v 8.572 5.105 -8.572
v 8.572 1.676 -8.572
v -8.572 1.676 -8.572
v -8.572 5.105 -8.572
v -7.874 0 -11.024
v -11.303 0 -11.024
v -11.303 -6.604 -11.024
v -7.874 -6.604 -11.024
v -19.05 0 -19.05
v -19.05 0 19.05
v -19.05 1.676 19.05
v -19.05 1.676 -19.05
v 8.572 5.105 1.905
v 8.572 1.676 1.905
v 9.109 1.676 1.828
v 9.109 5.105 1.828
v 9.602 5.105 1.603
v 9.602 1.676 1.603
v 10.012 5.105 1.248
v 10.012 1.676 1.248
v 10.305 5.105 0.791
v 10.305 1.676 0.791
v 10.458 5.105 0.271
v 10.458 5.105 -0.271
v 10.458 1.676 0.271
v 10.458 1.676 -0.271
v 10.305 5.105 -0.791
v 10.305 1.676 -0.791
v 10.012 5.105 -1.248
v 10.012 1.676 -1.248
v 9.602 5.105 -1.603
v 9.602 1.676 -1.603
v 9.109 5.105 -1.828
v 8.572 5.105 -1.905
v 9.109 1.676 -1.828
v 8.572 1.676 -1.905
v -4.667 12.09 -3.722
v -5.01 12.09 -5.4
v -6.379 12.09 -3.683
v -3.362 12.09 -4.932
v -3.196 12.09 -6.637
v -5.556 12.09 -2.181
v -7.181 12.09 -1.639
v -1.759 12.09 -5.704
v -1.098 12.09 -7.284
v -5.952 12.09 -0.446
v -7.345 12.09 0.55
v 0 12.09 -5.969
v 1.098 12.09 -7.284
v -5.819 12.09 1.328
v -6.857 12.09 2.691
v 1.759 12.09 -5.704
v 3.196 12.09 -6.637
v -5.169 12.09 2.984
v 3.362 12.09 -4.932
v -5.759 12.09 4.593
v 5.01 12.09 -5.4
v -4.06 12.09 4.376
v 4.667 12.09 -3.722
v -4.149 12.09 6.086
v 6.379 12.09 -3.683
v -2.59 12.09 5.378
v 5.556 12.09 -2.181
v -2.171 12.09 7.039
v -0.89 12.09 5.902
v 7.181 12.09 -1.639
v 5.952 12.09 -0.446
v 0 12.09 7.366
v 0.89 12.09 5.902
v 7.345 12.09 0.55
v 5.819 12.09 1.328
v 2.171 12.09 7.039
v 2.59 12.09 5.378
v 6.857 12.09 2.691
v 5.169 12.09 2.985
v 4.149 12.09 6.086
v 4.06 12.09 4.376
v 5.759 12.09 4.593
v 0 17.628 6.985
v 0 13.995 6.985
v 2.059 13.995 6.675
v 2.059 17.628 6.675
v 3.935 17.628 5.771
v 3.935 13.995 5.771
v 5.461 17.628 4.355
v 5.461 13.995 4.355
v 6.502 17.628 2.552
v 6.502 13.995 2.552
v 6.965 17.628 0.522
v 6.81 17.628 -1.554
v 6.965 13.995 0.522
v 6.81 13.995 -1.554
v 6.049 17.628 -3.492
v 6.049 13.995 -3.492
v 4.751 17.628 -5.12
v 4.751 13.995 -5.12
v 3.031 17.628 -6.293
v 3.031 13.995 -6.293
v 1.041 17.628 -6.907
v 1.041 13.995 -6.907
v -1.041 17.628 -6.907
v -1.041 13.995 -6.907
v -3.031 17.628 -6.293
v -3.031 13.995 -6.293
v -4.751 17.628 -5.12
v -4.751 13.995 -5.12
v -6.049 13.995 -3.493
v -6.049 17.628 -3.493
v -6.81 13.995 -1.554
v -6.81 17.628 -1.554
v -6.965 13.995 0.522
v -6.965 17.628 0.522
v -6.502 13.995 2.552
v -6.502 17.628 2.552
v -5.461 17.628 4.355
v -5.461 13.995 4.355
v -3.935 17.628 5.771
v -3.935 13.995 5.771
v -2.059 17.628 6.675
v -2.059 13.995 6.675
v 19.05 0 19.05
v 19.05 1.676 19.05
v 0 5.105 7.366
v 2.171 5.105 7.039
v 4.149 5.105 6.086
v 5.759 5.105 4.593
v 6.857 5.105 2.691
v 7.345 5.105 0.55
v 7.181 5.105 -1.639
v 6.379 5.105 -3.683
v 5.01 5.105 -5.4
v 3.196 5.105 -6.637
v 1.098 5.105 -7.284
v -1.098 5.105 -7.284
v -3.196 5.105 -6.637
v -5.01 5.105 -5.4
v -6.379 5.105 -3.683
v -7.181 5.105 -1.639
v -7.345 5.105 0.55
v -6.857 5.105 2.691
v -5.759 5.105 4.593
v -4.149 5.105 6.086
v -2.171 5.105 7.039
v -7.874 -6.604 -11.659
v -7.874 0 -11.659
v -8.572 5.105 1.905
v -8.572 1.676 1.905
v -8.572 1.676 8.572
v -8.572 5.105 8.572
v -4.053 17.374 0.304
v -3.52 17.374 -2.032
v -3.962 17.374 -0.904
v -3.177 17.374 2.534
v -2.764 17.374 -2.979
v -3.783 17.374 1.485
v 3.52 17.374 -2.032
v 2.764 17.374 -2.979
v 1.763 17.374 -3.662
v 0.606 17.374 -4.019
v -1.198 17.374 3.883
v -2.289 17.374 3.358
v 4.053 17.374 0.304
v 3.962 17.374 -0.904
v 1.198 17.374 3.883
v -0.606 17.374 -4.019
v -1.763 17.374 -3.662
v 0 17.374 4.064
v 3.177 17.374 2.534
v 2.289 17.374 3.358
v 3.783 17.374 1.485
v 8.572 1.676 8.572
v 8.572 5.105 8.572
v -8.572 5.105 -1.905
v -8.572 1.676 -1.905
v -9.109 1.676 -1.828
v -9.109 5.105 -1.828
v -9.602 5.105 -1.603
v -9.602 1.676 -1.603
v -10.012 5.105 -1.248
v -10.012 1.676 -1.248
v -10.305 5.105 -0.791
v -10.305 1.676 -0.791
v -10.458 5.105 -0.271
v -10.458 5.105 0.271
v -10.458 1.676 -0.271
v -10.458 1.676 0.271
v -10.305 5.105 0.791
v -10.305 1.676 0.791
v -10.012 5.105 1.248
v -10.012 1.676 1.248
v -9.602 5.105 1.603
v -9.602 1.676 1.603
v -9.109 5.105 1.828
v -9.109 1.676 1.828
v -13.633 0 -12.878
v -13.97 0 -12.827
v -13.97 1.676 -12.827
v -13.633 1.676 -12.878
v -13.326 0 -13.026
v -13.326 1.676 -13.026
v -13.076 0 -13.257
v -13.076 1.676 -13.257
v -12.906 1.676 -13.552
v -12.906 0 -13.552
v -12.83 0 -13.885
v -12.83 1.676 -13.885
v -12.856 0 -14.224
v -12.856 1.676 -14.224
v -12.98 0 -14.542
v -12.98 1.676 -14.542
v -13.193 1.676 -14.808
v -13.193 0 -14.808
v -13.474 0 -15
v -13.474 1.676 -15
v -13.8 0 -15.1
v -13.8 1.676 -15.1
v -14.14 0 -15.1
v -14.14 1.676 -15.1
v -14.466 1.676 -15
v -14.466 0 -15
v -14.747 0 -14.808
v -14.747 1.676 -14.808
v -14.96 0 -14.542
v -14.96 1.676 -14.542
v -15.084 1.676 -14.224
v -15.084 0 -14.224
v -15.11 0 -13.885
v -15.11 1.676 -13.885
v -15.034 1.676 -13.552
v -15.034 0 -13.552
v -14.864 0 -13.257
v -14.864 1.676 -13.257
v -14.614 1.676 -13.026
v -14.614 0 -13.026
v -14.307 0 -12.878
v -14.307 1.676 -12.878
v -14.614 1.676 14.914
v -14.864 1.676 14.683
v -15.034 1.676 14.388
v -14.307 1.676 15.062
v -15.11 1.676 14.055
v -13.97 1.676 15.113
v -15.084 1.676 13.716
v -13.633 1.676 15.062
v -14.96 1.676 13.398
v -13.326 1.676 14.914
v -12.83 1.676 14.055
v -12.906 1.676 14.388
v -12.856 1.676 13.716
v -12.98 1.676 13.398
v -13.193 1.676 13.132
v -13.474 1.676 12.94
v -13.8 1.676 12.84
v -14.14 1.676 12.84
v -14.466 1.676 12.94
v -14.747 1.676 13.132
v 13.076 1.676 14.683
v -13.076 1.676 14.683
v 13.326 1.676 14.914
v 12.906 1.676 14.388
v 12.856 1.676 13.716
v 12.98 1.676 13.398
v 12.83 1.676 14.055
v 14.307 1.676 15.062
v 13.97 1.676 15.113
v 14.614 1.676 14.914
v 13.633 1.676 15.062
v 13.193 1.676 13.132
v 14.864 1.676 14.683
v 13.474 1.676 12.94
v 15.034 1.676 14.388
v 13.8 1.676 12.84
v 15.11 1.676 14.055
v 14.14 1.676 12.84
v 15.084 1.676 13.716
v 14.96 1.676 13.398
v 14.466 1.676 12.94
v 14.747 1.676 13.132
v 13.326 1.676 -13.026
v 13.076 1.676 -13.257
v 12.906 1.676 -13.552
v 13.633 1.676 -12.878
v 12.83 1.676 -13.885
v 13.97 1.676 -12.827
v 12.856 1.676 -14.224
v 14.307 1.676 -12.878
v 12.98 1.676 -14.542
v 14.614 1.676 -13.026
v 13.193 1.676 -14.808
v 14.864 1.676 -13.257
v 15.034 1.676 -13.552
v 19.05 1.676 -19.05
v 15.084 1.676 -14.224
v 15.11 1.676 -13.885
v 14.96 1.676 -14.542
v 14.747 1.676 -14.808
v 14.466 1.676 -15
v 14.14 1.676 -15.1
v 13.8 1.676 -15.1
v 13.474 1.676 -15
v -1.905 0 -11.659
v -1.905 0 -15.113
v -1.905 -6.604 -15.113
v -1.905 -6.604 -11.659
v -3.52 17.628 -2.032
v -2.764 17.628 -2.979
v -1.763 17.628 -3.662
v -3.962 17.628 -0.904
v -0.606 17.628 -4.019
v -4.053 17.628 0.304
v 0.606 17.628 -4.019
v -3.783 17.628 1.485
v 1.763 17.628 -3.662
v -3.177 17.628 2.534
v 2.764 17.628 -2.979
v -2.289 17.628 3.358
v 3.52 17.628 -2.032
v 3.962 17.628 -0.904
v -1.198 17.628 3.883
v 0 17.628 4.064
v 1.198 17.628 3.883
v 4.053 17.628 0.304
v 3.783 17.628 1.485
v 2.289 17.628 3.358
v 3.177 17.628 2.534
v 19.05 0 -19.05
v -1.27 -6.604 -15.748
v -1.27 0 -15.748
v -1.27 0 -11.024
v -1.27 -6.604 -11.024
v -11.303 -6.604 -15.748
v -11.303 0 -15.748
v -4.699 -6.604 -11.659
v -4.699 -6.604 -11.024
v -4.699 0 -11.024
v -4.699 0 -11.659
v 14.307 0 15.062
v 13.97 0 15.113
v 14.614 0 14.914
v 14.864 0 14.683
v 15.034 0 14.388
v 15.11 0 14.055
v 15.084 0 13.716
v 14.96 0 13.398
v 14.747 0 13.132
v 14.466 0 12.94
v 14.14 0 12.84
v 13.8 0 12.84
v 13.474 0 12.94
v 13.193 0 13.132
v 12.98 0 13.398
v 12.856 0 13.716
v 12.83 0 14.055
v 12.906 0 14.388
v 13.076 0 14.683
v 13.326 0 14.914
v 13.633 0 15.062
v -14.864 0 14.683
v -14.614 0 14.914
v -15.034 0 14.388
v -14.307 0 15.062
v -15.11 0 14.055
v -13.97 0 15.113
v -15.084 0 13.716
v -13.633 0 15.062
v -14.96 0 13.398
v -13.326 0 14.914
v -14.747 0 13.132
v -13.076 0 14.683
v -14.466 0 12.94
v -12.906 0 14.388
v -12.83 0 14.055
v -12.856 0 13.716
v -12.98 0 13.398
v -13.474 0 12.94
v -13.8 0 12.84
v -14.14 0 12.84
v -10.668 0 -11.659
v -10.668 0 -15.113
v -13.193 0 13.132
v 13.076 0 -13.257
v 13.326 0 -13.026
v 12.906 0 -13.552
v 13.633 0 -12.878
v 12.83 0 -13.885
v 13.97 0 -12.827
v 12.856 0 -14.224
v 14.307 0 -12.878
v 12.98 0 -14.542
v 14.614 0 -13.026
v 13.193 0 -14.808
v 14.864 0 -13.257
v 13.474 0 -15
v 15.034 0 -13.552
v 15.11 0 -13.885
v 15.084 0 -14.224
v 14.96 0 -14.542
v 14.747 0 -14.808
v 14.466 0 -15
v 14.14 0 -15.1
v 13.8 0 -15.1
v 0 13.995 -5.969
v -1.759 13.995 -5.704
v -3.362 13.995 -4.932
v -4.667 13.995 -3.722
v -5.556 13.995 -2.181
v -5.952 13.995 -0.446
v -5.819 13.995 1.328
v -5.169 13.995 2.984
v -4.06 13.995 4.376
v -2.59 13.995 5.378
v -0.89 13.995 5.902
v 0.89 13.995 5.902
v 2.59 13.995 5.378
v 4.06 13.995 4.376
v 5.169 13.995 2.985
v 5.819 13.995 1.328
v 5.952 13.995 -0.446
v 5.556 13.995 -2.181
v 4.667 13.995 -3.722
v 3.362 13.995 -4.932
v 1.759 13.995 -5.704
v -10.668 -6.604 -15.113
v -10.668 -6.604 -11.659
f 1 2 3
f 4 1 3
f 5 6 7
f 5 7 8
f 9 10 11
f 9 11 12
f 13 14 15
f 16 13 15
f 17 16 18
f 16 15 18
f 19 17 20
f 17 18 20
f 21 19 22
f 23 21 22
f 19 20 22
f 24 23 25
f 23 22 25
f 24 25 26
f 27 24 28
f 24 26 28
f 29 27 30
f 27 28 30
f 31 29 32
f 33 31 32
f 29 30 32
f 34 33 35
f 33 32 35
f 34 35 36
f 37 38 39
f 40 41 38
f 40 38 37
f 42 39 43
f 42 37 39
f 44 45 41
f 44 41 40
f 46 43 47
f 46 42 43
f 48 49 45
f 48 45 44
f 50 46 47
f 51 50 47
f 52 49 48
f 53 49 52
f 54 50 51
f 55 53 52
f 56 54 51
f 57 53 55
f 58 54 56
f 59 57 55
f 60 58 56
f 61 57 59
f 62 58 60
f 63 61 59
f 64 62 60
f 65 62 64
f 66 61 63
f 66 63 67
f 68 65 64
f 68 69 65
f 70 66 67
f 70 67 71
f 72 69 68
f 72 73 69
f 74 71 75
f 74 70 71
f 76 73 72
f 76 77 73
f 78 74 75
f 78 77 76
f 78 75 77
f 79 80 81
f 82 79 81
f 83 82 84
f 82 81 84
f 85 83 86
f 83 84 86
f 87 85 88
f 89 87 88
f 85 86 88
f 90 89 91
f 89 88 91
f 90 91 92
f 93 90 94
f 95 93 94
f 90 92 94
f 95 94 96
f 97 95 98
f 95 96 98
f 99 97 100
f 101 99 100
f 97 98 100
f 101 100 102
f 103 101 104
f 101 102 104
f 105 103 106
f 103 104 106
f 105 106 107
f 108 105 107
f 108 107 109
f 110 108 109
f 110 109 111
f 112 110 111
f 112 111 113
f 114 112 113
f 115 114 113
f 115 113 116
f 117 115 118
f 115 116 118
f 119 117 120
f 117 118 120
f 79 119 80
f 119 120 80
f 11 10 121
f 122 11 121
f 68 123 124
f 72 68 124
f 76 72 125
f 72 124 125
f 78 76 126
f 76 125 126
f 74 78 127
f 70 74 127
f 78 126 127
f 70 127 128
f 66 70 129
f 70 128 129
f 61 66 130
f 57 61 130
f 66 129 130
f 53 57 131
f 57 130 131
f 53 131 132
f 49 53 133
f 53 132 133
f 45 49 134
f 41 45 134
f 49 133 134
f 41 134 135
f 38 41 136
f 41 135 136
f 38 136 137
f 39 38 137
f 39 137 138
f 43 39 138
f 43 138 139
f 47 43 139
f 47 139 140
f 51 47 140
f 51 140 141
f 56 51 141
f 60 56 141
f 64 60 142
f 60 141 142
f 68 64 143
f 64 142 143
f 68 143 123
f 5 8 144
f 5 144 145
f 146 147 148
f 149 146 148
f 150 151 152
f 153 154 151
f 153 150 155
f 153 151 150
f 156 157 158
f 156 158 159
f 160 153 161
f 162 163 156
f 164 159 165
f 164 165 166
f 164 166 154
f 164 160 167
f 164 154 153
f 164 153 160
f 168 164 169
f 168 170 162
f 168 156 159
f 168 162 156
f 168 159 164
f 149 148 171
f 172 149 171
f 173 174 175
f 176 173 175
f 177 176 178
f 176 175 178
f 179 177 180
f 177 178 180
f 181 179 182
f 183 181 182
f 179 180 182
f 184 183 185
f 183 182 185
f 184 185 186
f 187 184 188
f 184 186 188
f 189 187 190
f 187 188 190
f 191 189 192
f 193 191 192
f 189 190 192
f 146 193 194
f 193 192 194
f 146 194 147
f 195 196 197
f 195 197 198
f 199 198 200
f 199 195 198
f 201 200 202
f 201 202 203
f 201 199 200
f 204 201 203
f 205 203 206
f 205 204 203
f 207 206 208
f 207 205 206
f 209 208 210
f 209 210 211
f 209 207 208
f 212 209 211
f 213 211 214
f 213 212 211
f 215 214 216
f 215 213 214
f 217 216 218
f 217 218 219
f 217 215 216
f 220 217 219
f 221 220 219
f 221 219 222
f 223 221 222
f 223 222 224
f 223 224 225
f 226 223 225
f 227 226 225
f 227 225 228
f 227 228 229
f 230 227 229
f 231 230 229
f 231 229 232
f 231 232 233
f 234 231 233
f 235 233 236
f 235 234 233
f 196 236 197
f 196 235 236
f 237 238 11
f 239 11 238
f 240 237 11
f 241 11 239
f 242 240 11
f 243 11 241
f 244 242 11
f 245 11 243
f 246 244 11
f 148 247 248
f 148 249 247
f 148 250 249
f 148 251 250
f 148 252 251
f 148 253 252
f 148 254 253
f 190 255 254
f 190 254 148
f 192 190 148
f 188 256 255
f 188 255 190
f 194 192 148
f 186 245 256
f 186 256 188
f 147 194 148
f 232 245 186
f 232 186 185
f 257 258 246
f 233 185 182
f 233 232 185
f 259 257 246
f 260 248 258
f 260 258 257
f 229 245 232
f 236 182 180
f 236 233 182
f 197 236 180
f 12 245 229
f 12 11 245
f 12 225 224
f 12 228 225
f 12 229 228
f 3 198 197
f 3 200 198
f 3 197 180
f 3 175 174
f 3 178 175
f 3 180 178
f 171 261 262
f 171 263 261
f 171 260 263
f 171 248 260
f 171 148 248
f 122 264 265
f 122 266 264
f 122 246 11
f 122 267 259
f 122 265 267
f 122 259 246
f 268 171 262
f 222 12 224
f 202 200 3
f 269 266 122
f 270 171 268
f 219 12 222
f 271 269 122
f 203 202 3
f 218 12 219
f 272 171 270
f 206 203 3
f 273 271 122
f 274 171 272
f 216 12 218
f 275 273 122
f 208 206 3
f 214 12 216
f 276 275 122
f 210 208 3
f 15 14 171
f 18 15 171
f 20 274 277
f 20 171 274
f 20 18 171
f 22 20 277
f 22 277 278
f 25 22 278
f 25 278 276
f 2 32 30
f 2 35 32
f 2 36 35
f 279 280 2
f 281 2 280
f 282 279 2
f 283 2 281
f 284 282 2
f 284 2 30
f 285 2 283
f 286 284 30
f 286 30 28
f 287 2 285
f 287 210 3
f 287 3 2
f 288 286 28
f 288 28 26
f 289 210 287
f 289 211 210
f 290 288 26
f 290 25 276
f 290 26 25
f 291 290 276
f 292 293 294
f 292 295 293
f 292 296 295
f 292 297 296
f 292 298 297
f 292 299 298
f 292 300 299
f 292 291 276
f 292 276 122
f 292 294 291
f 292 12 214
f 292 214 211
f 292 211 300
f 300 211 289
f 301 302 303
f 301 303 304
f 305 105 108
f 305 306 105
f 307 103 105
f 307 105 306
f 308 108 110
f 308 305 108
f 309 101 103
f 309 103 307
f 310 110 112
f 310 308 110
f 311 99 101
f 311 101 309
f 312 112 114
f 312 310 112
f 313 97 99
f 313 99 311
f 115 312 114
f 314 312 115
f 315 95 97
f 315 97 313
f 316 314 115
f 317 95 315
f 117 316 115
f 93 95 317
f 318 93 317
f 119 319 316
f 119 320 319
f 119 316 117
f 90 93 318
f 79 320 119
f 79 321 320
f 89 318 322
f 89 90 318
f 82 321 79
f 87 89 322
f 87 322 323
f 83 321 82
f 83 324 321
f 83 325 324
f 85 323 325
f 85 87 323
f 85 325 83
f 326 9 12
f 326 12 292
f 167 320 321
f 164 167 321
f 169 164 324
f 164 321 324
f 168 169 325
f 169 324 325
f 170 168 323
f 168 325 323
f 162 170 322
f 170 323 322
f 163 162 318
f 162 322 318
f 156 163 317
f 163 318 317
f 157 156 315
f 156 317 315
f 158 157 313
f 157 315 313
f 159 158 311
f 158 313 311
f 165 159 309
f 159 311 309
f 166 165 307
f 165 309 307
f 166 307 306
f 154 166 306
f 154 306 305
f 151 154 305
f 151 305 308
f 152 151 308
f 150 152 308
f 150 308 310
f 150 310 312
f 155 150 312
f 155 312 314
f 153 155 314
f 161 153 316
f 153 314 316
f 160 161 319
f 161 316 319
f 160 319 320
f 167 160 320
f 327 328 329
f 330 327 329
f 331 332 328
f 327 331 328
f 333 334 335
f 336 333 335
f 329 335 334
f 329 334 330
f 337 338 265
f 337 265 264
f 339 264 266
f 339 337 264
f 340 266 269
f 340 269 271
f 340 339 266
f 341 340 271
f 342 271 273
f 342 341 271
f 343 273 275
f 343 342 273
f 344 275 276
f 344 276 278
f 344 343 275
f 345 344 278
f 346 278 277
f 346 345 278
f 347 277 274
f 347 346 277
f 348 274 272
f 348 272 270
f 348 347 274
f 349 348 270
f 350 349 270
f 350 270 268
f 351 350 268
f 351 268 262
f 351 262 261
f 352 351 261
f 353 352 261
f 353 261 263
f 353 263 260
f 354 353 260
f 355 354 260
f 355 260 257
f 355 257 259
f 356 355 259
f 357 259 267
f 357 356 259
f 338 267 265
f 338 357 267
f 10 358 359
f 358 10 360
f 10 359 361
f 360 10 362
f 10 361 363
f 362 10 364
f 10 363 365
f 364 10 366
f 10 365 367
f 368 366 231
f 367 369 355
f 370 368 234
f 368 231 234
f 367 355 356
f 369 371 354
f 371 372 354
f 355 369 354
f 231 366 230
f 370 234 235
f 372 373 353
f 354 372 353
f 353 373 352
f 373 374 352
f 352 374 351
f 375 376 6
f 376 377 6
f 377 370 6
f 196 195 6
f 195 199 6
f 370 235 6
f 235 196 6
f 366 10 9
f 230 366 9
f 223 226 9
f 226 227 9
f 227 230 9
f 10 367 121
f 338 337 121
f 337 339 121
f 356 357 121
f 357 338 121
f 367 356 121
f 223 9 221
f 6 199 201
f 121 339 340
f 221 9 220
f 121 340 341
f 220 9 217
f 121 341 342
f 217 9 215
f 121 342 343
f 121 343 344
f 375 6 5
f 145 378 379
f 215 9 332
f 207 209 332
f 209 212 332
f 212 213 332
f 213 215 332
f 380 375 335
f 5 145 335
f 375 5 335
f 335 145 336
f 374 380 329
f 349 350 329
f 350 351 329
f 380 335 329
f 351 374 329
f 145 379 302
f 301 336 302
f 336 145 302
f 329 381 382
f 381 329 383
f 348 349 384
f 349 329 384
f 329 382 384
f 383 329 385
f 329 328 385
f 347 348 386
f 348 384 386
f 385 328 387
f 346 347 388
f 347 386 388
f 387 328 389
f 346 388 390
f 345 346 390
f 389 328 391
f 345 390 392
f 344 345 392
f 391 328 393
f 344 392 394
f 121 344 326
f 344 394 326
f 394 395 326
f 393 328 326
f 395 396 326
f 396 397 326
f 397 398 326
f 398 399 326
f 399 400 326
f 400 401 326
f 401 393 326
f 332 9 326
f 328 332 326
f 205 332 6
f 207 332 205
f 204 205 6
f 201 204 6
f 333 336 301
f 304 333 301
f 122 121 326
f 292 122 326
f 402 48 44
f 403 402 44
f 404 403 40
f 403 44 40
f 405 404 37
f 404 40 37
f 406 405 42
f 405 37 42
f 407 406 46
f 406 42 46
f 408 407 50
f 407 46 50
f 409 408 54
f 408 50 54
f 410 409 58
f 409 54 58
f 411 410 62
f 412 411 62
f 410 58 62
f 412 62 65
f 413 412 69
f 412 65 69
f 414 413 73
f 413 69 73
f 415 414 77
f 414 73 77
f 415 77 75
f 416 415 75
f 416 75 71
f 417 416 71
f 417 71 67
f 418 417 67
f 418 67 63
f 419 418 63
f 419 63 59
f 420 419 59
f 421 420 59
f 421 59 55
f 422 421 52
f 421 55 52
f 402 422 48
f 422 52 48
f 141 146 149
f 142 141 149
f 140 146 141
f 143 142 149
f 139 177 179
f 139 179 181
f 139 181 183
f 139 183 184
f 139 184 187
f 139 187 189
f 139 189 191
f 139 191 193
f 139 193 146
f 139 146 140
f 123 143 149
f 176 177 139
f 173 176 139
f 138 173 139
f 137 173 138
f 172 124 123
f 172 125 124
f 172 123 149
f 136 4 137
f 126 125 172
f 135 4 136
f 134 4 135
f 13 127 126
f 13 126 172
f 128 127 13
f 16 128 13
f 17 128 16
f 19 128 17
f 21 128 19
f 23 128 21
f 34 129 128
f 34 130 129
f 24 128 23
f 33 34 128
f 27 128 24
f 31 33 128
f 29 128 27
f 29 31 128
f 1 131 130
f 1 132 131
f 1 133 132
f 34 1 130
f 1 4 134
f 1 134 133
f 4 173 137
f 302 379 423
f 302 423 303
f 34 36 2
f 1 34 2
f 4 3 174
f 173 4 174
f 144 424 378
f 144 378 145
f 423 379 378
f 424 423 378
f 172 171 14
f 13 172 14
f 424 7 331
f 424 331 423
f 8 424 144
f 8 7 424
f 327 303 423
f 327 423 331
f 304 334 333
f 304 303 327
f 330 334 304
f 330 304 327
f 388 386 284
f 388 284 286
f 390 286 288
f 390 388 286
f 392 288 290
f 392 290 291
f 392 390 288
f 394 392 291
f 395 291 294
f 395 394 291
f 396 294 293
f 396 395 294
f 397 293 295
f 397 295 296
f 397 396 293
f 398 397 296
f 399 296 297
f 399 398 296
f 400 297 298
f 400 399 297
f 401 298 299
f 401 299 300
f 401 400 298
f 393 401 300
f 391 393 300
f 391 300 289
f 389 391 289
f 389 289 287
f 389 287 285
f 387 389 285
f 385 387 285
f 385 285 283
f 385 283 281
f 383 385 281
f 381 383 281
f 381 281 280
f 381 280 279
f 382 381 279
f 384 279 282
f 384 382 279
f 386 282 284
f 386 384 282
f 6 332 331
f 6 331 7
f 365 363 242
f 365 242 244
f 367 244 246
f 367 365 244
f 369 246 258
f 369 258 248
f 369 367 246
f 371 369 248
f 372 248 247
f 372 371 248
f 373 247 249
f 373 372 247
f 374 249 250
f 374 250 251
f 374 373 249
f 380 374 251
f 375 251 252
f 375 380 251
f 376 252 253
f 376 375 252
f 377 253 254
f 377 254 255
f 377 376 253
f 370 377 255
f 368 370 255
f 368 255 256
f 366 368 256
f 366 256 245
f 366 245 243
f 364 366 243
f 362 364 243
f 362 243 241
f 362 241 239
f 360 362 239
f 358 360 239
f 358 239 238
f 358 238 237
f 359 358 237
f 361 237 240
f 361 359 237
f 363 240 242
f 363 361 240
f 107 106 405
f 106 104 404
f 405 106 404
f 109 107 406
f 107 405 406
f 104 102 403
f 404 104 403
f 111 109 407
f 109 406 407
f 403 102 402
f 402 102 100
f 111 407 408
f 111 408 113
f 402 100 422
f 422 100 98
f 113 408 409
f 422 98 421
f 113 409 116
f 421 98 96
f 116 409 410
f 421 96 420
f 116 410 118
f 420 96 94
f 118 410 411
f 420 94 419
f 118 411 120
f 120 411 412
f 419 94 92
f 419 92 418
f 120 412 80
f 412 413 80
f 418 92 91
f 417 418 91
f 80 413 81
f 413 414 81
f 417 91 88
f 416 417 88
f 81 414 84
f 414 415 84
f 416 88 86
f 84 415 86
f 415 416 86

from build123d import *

# Parameters (mm, degrees)
SKETCH1_W           = 38.1
SKETCH1_H           = 38.1
SKETCH1_R           = 1.143
BOSS_EXTRUDE1_DEPTH = 1.6764
BOSS_EXTRUDE2_DEPTH = 3.429
SKETCH3_R           = 7.366
BOSS_EXTRUDE3_DEPTH = 6.985
SKETCH4_R           = 5.969
BOSS_EXTRUDE4_DEPTH = 1.905
SKETCH5_R           = 6.985
BOSS_EXTRUDE5_DEPTH = 3.6322
SKETCH6_R           = 4.064
CUT_EXTRUDE1_DEPTH  = 0.254
SKETCH7_W           = 10.033
SKETCH7_H           = 4.7244
SKETCH7_W_2         = 8.763
SKETCH7_H_2         = 3.4544
BOSS_EXTRUDE6_DEPTH = 6.604
CUT_EXTRUDE2_REACH  = 41.725
SKETCH9_W           = 3.175
SKETCH9_H           = 6.604


with BuildPart() as part:
    # Sketch1 → Boss-Extrude1 (new body)
    with BuildSketch(Plane(origin=(0, 0, 0), x_dir=(1, 0, 0), z_dir=(0, 1, 0))):
        Rectangle(SKETCH1_W, SKETCH1_H)
        with Locations(Location((-13.97, 13.97, 0), (0, 0, 270))):
            Circle(SKETCH1_R, mode=Mode.SUBTRACT)
        with Locations(Location((-13.97, -13.97, 0), (0, 0, 270))):
            Circle(SKETCH1_R, mode=Mode.SUBTRACT)
        with Locations(Location((13.97, -13.97, 0), (0, 0, 270))):
            Circle(SKETCH1_R, mode=Mode.SUBTRACT)
        with Locations(Location((13.97, 13.97, 0), (0, 0, 270))):
            Circle(SKETCH1_R, mode=Mode.SUBTRACT)
    extrude(amount=BOSS_EXTRUDE1_DEPTH)

    # Sketch2 → Boss-Extrude2 (add)
    with BuildSketch(Plane(origin=(0, 1.6764, 0), x_dir=(1, 0, 0), z_dir=(0, 1, 0))):
        with BuildLine():
            Line((-8.5725, -1.905), (-8.5725, -8.5725))
            Line((-8.5725, -8.5725), (8.5725, -8.5725))
            Line((8.5725, -8.5725), (8.5725, -1.905))
            ThreePointArc((8.5725, -1.905), (10.4775, 0), (8.5725, 1.905))
            Line((8.5725, 1.905), (8.5725, 8.5725))
            Line((8.5725, 8.5725), (-8.5725, 8.5725))
            Line((-8.5725, 8.5725), (-8.5725, 1.905))
            ThreePointArc((-8.5725, 1.905), (-10.4775, 0), (-8.5725, -1.905))
        make_face()
    extrude(amount=BOSS_EXTRUDE2_DEPTH)

    # Sketch3 → Boss-Extrude3 (add)
    with BuildSketch(Plane(origin=(0, 5.1054, 0), x_dir=(1, 0, 0), z_dir=(0, 1, 0))):
        with Locations(Location((0, 0, 0), (0, 0, 270))):
            Circle(SKETCH3_R)
    extrude(amount=BOSS_EXTRUDE3_DEPTH)

    # Sketch4 → Boss-Extrude4 (add)
    with BuildSketch(Plane(origin=(0, 12.0904, 0), x_dir=(1, 0, 0), z_dir=(0, 1, 0))):
        with Locations(Location((0, 0, 0), (0, 0, 90))):
            Circle(SKETCH4_R)
    extrude(amount=BOSS_EXTRUDE4_DEPTH)

    # Sketch5 → Boss-Extrude5 (add)
    with BuildSketch(Plane(origin=(0, 13.9954, 0), x_dir=(1, 0, 0), z_dir=(0, 1, 0))):
        with Locations(Location((0, 0, 0), (0, 0, 270))):
            Circle(SKETCH5_R)
    extrude(amount=BOSS_EXTRUDE5_DEPTH)

    # Sketch6 → Cut-Extrude1 (cut)
    with BuildSketch(Plane(origin=(0, 17.6276, 0), x_dir=(1, 0, 0), z_dir=(0, 1, 0))):
        with Locations(Location((0, 0, 0), (0, 0, 270))):
            Circle(SKETCH6_R)
    extrude(amount=-CUT_EXTRUDE1_DEPTH, mode=Mode.SUBTRACT)

    # Sketch7 → Boss-Extrude6 (add)
    with BuildSketch(Plane.XZ):
        with Locations((-6.2865, -13.3858)):
            Rectangle(SKETCH7_W, SKETCH7_H)
        with Locations((-6.2865, -13.3858)):
            Rectangle(SKETCH7_W_2, SKETCH7_H_2, mode=Mode.SUBTRACT)
    extrude(amount=BOSS_EXTRUDE6_DEPTH)

    # Sketch9 → Cut-Extrude2 (cut, up to next)
    with BuildSketch(Plane.XY.offset(-11.0236), mode=Mode.PRIVATE) as cut_extrude2_sk1:
        with Locations((-6.2865, -3.302)):
            Rectangle(SKETCH9_W, SKETCH9_H)
    cut_extrude2_tool1 = extrude(cut_extrude2_sk1.sketch, amount=-CUT_EXTRUDE2_REACH, mode=Mode.PRIVATE) & part.part
    add(cut_extrude2_tool1.solids().sort_by_distance((-6.2865, -3.302, -11.0236))[0], mode=Mode.SUBTRACT)


solid = part.part
